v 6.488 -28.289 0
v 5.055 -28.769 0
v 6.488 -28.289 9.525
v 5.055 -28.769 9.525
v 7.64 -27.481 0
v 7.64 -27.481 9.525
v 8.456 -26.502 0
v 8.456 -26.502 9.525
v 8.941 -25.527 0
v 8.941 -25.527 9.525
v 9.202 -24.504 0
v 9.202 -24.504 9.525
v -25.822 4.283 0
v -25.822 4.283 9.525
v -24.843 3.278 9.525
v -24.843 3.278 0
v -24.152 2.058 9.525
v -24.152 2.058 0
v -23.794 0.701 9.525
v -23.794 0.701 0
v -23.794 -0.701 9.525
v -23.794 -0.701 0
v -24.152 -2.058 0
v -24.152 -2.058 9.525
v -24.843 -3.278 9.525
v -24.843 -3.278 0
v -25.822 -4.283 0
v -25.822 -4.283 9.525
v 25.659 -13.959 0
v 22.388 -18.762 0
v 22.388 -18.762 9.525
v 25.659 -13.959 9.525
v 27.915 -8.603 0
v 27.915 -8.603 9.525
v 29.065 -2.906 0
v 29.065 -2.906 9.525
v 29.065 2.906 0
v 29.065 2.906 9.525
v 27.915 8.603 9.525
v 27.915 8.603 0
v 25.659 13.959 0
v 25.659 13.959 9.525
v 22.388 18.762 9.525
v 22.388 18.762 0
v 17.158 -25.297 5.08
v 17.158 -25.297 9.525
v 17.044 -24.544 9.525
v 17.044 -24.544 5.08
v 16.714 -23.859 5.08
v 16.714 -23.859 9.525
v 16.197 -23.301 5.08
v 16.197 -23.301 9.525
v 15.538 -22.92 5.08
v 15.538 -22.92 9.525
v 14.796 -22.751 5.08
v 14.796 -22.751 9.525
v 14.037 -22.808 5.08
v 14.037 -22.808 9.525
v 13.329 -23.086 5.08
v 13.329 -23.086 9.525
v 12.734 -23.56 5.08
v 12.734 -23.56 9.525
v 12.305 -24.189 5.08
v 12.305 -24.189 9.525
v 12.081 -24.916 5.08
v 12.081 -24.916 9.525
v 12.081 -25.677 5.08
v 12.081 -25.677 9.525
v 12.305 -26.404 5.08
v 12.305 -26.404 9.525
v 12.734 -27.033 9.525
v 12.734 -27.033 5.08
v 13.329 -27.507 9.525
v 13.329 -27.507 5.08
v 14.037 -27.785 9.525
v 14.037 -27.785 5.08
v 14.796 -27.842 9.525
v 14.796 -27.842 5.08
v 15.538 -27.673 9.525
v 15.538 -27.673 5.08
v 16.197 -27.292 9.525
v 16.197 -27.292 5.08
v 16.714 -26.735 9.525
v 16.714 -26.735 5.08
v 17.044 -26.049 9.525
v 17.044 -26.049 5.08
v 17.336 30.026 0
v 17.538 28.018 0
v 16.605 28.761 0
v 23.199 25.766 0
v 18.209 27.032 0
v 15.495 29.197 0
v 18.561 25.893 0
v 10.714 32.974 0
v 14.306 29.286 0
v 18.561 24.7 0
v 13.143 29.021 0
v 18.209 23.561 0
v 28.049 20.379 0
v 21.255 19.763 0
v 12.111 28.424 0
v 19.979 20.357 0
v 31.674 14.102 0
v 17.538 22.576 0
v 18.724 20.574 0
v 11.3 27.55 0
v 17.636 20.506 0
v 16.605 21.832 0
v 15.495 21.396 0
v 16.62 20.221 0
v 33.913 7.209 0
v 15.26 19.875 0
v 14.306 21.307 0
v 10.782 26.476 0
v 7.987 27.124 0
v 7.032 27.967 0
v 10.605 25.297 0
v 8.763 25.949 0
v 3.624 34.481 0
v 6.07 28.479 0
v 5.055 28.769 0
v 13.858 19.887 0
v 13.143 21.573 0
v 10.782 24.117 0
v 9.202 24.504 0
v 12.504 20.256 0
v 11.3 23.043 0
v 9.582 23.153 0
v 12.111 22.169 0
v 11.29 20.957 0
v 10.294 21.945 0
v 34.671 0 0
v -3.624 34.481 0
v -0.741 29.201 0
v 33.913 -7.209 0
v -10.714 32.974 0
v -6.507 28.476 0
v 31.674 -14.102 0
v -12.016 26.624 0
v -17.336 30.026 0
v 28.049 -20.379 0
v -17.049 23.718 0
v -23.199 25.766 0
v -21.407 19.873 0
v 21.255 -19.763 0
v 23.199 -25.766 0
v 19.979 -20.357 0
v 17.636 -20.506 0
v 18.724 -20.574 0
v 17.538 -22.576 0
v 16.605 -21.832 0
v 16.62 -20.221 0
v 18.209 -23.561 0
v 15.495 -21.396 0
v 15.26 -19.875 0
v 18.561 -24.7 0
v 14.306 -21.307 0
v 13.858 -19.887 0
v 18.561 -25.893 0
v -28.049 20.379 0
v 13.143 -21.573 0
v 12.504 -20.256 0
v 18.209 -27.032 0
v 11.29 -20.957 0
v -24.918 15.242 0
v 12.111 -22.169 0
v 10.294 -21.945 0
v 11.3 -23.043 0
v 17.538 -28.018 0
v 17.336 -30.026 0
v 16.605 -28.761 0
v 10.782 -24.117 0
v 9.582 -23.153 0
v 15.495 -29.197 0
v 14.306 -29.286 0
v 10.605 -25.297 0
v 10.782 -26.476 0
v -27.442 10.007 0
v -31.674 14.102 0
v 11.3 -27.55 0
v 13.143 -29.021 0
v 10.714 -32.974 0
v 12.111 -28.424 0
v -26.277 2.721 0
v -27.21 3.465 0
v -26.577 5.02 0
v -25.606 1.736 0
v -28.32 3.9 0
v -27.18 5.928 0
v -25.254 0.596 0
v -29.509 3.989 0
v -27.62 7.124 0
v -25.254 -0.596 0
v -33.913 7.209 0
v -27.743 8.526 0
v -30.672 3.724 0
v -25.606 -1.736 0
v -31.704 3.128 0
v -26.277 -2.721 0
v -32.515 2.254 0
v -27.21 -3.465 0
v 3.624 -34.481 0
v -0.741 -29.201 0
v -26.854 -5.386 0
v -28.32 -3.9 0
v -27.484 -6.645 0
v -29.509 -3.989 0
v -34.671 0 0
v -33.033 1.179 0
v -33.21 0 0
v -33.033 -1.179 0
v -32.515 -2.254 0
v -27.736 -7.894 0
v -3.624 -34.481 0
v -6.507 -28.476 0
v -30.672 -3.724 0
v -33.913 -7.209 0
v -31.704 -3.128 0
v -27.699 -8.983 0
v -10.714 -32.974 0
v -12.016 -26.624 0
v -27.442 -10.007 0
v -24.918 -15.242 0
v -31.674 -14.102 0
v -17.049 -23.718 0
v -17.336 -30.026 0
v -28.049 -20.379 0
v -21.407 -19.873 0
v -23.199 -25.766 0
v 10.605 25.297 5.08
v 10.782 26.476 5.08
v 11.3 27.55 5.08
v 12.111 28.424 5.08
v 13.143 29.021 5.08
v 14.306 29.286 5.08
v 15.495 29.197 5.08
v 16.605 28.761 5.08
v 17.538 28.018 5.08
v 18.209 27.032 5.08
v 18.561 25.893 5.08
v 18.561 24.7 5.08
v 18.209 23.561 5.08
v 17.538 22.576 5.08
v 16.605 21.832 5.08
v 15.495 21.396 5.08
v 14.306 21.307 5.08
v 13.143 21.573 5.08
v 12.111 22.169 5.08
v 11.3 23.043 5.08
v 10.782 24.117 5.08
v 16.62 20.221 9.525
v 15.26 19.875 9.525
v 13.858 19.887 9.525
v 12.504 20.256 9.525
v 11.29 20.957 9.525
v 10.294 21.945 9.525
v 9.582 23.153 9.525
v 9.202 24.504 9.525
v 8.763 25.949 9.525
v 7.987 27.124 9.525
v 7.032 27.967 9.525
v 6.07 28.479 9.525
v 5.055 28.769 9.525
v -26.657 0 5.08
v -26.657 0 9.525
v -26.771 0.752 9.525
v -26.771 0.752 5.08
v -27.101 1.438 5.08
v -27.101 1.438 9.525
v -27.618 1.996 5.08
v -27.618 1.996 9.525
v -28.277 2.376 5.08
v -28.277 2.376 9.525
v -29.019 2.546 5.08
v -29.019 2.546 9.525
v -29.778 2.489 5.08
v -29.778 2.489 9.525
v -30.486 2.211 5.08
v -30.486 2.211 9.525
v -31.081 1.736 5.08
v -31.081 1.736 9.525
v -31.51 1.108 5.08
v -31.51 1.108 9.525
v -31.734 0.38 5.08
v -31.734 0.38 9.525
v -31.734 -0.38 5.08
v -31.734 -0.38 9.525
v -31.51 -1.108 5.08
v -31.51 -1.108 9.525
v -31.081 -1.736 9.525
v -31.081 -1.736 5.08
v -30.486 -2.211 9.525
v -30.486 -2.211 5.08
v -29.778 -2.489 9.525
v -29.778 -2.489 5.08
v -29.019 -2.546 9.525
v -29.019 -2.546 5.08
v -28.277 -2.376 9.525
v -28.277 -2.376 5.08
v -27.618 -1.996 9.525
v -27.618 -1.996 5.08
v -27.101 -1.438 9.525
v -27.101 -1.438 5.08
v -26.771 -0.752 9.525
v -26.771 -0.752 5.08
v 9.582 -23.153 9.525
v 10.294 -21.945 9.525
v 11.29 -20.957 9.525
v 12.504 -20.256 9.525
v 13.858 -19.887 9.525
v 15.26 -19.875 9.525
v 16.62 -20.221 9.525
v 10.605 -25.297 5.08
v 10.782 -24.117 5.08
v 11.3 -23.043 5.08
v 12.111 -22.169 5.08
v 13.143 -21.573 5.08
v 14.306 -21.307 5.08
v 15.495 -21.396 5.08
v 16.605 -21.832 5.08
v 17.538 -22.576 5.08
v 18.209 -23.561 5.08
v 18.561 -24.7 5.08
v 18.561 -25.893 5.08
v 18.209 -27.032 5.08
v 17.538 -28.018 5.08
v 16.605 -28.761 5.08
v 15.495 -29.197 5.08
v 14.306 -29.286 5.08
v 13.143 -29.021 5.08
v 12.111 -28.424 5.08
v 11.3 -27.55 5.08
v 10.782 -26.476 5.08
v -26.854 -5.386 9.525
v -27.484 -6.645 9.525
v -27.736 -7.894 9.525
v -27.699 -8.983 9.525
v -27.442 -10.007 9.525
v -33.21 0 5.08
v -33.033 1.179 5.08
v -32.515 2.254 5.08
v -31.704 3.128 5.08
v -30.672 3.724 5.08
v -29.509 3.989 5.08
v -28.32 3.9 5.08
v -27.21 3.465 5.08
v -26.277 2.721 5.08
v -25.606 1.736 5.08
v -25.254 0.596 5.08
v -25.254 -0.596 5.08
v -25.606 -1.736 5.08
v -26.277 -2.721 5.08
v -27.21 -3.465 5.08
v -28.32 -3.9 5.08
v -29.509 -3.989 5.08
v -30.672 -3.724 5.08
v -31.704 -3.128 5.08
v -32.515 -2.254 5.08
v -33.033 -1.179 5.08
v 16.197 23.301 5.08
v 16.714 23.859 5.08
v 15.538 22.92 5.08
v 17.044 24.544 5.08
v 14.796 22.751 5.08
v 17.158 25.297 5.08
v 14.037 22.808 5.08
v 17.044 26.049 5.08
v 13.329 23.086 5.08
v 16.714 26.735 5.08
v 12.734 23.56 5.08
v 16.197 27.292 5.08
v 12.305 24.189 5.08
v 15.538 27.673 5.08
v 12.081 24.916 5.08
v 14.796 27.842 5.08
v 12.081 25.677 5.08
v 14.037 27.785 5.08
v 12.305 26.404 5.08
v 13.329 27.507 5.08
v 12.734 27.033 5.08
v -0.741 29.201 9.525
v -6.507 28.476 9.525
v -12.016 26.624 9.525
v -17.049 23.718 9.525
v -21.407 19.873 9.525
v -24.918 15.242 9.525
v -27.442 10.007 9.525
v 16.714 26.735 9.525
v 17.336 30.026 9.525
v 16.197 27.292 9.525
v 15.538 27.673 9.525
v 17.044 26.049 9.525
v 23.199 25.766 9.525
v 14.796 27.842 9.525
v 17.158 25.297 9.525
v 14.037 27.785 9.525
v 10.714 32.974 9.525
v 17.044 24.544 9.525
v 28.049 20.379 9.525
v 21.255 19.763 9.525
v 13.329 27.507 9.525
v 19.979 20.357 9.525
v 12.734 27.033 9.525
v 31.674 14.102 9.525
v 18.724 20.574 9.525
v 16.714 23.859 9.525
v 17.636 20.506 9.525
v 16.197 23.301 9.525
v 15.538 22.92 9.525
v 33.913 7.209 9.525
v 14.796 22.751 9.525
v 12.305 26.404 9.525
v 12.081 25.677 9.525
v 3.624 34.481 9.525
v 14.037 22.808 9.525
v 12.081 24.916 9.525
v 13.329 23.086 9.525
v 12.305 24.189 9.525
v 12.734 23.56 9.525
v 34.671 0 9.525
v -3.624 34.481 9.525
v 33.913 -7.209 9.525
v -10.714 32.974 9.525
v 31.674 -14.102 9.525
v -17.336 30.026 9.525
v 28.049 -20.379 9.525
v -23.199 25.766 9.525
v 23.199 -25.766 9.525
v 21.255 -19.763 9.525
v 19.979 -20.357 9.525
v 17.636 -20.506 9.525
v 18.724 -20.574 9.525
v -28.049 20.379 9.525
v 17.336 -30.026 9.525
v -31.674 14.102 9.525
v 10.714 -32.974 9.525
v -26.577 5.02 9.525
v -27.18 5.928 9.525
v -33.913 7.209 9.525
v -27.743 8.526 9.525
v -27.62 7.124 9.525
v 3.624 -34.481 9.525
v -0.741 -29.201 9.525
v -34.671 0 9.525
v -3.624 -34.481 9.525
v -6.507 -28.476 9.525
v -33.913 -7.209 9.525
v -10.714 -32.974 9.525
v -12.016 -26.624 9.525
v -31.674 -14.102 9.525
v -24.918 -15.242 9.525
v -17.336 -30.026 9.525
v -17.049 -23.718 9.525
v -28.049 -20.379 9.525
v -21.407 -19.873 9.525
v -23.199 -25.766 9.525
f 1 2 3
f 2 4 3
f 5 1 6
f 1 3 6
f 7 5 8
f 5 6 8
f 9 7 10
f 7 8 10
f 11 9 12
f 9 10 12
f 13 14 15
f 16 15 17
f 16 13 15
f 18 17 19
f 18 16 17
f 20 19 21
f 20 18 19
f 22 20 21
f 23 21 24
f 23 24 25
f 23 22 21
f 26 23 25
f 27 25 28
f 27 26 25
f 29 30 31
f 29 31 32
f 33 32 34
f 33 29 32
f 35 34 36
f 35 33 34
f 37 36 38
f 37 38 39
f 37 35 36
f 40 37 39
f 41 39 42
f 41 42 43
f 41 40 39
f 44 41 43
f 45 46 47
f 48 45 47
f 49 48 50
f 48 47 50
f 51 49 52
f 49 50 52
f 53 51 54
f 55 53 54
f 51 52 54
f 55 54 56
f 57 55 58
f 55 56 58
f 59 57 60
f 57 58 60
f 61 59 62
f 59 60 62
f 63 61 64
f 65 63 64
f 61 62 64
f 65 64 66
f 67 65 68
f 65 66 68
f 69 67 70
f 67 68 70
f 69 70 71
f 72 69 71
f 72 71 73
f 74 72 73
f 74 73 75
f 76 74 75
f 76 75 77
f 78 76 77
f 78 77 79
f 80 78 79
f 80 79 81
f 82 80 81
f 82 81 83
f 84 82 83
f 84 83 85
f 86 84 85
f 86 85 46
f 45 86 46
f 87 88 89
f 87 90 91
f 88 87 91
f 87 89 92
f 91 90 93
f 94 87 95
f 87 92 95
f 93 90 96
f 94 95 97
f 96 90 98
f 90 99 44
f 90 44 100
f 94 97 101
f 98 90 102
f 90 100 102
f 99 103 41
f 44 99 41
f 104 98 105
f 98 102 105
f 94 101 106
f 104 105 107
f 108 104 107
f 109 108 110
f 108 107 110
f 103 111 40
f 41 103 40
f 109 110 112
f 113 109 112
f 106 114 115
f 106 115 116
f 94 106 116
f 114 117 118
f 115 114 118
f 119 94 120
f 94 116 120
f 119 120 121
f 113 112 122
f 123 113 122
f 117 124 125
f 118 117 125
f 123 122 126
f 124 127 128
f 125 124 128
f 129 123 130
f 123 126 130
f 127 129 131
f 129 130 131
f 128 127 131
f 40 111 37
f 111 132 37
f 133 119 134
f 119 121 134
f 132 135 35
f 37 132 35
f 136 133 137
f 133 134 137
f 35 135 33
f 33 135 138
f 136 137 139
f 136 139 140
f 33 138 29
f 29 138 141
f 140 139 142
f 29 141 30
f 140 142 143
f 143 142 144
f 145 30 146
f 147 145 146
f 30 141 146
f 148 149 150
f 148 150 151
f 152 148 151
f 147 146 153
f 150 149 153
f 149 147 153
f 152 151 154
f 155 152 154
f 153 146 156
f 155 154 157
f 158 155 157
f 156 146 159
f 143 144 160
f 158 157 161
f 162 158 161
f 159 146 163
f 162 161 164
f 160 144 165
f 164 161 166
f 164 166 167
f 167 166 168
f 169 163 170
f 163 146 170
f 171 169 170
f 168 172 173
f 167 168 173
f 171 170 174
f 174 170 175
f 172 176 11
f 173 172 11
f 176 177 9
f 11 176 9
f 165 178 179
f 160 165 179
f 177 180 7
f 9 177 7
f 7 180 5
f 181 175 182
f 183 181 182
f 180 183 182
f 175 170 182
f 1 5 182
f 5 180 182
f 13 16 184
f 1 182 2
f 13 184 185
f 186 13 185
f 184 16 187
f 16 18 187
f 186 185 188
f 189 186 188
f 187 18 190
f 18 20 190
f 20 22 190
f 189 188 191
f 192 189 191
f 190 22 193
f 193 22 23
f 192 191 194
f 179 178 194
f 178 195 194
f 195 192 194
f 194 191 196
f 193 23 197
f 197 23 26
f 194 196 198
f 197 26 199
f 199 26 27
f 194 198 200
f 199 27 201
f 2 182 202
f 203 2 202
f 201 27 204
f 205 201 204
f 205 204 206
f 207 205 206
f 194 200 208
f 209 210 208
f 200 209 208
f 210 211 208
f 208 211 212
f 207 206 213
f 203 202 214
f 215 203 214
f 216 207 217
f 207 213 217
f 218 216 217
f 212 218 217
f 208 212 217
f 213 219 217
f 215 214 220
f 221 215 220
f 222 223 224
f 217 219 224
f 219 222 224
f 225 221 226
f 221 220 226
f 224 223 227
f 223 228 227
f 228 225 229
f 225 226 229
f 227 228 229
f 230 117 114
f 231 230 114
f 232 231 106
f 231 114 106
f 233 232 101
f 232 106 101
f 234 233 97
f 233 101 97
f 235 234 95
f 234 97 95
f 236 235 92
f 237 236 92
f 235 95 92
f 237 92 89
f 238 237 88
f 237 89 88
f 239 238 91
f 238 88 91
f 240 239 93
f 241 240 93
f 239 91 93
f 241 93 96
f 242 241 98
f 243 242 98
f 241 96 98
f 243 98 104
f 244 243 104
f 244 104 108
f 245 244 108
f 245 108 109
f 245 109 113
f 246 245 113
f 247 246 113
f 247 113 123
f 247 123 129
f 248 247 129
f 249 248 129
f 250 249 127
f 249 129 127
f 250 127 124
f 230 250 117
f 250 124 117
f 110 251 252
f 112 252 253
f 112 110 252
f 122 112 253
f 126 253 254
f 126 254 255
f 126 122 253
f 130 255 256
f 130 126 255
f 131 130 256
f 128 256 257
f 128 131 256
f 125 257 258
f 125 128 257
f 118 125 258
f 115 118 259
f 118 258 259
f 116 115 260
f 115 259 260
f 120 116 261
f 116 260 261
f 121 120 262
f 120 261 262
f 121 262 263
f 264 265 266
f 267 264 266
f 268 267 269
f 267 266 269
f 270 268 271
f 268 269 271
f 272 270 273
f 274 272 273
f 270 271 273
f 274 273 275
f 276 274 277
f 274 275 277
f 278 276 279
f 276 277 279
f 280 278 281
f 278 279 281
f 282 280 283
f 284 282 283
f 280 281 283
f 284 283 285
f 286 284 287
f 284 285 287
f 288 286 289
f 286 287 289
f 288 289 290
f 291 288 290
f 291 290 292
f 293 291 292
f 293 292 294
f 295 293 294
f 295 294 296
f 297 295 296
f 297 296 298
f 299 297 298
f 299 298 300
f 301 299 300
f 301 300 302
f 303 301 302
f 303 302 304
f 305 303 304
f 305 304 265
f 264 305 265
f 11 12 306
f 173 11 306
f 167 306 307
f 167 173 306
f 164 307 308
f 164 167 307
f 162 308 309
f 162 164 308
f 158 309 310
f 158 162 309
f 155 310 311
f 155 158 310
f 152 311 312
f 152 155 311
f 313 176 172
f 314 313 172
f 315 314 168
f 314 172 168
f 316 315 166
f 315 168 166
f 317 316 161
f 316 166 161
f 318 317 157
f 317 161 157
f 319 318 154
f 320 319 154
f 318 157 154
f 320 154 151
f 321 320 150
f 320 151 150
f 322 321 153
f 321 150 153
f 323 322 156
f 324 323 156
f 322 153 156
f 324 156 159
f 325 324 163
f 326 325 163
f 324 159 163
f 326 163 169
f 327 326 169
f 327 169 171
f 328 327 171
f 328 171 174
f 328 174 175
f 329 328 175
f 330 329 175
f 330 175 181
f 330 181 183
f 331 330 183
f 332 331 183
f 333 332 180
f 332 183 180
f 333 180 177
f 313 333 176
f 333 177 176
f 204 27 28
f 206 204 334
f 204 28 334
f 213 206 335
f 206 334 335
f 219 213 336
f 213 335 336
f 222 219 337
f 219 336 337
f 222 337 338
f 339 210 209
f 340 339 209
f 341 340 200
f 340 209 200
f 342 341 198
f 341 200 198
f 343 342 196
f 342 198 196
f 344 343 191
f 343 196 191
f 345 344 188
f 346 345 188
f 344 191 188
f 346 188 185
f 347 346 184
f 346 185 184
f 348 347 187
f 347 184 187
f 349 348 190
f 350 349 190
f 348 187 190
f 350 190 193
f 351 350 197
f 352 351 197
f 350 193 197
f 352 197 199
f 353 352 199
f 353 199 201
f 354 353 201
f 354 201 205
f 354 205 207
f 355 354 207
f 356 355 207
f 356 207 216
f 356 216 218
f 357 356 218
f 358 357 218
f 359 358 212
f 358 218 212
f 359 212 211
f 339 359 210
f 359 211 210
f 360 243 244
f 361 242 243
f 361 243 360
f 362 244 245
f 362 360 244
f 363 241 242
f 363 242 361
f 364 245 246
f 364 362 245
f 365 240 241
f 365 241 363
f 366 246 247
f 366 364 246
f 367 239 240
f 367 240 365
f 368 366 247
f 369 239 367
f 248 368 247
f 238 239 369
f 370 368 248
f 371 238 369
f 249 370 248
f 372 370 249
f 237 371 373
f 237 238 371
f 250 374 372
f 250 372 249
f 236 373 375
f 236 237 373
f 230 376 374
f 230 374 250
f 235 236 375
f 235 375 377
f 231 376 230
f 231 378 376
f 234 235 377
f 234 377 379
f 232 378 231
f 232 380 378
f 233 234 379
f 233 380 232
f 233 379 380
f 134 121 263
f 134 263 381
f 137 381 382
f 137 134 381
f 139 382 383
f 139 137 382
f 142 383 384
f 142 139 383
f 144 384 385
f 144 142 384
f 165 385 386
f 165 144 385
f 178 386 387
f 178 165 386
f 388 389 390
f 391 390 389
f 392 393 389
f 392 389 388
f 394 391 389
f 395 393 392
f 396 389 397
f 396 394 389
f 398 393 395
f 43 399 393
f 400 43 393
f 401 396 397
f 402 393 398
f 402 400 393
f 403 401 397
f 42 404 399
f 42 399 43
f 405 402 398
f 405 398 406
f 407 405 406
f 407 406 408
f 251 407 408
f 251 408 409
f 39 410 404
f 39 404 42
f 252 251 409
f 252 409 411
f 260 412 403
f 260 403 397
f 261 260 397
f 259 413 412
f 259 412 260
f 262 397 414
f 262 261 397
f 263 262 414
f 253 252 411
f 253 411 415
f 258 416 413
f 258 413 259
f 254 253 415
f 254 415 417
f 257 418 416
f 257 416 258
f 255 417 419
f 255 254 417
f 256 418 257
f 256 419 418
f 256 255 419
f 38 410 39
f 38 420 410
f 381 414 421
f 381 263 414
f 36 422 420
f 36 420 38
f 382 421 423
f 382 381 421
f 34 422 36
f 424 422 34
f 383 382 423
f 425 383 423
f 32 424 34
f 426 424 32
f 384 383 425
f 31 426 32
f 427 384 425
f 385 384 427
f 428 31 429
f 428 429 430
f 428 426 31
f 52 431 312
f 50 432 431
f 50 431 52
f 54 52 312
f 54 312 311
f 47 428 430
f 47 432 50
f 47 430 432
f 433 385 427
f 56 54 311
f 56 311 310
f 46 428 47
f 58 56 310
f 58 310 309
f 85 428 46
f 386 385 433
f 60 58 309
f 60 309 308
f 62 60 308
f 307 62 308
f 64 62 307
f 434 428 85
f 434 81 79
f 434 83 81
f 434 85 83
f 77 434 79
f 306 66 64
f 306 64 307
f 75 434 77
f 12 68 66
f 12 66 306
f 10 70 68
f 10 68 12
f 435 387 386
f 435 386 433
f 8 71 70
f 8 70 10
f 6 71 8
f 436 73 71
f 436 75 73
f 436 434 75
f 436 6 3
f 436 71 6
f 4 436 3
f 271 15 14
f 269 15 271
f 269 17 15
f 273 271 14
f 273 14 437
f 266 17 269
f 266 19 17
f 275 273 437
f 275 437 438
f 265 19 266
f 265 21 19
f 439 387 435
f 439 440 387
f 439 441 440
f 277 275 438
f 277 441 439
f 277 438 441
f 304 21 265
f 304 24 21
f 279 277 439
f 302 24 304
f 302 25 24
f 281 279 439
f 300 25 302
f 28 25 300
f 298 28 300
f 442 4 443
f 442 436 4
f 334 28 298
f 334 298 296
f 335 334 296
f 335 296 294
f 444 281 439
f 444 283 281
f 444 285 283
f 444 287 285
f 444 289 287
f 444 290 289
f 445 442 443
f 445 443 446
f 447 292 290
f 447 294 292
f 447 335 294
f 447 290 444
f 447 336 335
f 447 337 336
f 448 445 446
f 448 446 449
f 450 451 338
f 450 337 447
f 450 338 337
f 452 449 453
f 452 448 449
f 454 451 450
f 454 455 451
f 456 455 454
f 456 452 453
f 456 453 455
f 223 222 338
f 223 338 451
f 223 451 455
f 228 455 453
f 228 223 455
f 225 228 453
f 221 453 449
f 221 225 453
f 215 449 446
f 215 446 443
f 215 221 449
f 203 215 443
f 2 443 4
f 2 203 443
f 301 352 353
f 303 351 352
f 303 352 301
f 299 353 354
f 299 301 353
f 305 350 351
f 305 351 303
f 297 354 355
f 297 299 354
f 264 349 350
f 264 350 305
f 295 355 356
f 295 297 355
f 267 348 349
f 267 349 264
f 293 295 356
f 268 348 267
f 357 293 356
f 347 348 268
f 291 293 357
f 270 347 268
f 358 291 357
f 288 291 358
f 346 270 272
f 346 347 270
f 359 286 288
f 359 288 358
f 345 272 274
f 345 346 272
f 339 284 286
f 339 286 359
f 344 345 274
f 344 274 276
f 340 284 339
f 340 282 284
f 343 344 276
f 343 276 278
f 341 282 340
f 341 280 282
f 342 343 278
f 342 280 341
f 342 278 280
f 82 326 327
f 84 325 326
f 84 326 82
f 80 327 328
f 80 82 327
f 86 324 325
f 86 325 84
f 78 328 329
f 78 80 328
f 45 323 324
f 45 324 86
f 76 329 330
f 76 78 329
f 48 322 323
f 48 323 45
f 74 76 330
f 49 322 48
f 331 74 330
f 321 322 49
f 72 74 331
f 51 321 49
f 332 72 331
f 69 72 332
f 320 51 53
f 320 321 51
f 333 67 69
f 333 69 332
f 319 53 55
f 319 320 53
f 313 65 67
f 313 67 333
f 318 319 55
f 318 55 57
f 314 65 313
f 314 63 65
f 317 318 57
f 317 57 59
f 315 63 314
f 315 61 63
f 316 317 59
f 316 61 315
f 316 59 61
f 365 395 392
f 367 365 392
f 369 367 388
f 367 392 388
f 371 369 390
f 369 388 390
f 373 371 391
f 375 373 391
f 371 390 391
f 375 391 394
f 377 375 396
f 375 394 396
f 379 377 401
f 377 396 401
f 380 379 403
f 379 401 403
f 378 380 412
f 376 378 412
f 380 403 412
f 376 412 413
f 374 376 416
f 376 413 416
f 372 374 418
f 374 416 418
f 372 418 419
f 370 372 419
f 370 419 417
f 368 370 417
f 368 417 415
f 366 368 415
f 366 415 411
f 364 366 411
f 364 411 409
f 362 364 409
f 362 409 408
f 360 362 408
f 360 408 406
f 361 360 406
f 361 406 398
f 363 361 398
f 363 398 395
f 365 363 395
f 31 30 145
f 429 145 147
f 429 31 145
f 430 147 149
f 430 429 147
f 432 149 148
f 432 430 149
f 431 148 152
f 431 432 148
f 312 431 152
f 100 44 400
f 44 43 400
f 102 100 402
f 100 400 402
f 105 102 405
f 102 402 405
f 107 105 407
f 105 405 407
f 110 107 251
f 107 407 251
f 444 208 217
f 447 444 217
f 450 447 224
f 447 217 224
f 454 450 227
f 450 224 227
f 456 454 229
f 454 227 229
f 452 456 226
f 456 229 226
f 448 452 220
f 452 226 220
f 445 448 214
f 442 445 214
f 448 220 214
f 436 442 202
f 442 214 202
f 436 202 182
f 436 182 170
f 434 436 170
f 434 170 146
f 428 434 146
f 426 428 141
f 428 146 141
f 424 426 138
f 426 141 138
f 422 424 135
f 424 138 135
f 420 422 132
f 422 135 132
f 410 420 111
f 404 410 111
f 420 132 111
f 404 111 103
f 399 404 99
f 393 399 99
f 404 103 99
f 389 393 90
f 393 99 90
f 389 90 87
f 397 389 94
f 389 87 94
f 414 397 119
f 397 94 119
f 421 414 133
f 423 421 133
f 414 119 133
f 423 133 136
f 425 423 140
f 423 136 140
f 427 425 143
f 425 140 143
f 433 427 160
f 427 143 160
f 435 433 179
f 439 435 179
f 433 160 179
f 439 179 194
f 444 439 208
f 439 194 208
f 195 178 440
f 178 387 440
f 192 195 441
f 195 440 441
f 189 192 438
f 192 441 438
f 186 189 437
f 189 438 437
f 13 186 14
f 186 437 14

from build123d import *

# Parameters (mm, degrees)
SKETCH1_R                  = 34.671
BOSS_EXTRUDE1_DEPTH        = 9.525
FILLET1_R                  = 5.08
SKETCH2_R                  = 4.0005
CUT_EXTRUDE1_DEPTH         = 5.08
F_10_CLEARANCE_HOLE1_D     = 5.1054
F_10_CLEARANCE_HOLE1_DEPTH = 4.445


with BuildPart() as part:
    # Sketch1 → Boss-Extrude1 (new body)
    with BuildSketch(Plane.XY):
        with Locations(Location((0, 0, 0), (0, 0, 180))):
            Circle(SKETCH1_R)
        with BuildLine():
            ThreePointArc((19.058413969, -22.135965238), (29.21, 0), (19.058413969, 22.135965238))
            ThreePointArc((19.058413969, 22.135965238), (11.8745, 20.567237314), (9.641101249, 27.573053271))
            ThreePointArc((9.641101249, 27.573053271), (-14.605, 25.296602045), (-28.699515217, 5.437088034))
            ThreePointArc((-28.699515217, 5.437088034), (-23.749, 0), (-28.699515217, -5.437088034))
            ThreePointArc((-28.699515217, -5.437088034), (-14.605, -25.296602045), (9.641101249, -27.573053271))
            ThreePointArc((9.641101249, -27.573053271), (11.8745, -20.567237314), (19.058413969, -22.135965238))
        make_face(mode=Mode.SUBTRACT)
    extrude(amount=BOSS_EXTRUDE1_DEPTH)

    # Fillet1
    fillet1_edges = [part.edges().sort_by_distance(p)[0] for p in [
        (-28.699515217, 5.437088034, 4.7625),
        (-28.699515217, -5.437088034, 4.7625),
        (9.641101249, -27.573053271, 4.7625),
        (19.058413969, -22.135965238, 4.7625),
        (19.058413969, 22.135965238, 4.7625),
        (9.641101249, 27.573053271, 4.7625),
    ]]
    fillet(fillet1_edges, radius=FILLET1_R)

    # Sketch2 → Cut-Extrude1 (cut)
    with BuildSketch(Plane(origin=(0, 0, 0), x_dir=(-1, 0, 0), z_dir=(0, 0, -1))):
        with Locations((-14.605, 25.296602045)):
            Circle(SKETCH2_R)
        with Locations((29.21, 0)):
            Circle(SKETCH2_R)
        with Locations((-14.605, -25.296602045)):
            Circle(SKETCH2_R)
    extrude(amount=-CUT_EXTRUDE1_DEPTH, mode=Mode.SUBTRACT)

    # #10 Clearance Hole1
    with Locations(Plane(origin=(0, 0, 5.08), x_dir=(-1, 0, 0), z_dir=(0, 0, -1))):
        with Locations((-14.605, 25.296602045), (29.21, 0), (-14.605, -25.296602045), (0, 0)):
            Hole(F_10_CLEARANCE_HOLE1_D / 2, depth=F_10_CLEARANCE_HOLE1_DEPTH)


solid = part.part
